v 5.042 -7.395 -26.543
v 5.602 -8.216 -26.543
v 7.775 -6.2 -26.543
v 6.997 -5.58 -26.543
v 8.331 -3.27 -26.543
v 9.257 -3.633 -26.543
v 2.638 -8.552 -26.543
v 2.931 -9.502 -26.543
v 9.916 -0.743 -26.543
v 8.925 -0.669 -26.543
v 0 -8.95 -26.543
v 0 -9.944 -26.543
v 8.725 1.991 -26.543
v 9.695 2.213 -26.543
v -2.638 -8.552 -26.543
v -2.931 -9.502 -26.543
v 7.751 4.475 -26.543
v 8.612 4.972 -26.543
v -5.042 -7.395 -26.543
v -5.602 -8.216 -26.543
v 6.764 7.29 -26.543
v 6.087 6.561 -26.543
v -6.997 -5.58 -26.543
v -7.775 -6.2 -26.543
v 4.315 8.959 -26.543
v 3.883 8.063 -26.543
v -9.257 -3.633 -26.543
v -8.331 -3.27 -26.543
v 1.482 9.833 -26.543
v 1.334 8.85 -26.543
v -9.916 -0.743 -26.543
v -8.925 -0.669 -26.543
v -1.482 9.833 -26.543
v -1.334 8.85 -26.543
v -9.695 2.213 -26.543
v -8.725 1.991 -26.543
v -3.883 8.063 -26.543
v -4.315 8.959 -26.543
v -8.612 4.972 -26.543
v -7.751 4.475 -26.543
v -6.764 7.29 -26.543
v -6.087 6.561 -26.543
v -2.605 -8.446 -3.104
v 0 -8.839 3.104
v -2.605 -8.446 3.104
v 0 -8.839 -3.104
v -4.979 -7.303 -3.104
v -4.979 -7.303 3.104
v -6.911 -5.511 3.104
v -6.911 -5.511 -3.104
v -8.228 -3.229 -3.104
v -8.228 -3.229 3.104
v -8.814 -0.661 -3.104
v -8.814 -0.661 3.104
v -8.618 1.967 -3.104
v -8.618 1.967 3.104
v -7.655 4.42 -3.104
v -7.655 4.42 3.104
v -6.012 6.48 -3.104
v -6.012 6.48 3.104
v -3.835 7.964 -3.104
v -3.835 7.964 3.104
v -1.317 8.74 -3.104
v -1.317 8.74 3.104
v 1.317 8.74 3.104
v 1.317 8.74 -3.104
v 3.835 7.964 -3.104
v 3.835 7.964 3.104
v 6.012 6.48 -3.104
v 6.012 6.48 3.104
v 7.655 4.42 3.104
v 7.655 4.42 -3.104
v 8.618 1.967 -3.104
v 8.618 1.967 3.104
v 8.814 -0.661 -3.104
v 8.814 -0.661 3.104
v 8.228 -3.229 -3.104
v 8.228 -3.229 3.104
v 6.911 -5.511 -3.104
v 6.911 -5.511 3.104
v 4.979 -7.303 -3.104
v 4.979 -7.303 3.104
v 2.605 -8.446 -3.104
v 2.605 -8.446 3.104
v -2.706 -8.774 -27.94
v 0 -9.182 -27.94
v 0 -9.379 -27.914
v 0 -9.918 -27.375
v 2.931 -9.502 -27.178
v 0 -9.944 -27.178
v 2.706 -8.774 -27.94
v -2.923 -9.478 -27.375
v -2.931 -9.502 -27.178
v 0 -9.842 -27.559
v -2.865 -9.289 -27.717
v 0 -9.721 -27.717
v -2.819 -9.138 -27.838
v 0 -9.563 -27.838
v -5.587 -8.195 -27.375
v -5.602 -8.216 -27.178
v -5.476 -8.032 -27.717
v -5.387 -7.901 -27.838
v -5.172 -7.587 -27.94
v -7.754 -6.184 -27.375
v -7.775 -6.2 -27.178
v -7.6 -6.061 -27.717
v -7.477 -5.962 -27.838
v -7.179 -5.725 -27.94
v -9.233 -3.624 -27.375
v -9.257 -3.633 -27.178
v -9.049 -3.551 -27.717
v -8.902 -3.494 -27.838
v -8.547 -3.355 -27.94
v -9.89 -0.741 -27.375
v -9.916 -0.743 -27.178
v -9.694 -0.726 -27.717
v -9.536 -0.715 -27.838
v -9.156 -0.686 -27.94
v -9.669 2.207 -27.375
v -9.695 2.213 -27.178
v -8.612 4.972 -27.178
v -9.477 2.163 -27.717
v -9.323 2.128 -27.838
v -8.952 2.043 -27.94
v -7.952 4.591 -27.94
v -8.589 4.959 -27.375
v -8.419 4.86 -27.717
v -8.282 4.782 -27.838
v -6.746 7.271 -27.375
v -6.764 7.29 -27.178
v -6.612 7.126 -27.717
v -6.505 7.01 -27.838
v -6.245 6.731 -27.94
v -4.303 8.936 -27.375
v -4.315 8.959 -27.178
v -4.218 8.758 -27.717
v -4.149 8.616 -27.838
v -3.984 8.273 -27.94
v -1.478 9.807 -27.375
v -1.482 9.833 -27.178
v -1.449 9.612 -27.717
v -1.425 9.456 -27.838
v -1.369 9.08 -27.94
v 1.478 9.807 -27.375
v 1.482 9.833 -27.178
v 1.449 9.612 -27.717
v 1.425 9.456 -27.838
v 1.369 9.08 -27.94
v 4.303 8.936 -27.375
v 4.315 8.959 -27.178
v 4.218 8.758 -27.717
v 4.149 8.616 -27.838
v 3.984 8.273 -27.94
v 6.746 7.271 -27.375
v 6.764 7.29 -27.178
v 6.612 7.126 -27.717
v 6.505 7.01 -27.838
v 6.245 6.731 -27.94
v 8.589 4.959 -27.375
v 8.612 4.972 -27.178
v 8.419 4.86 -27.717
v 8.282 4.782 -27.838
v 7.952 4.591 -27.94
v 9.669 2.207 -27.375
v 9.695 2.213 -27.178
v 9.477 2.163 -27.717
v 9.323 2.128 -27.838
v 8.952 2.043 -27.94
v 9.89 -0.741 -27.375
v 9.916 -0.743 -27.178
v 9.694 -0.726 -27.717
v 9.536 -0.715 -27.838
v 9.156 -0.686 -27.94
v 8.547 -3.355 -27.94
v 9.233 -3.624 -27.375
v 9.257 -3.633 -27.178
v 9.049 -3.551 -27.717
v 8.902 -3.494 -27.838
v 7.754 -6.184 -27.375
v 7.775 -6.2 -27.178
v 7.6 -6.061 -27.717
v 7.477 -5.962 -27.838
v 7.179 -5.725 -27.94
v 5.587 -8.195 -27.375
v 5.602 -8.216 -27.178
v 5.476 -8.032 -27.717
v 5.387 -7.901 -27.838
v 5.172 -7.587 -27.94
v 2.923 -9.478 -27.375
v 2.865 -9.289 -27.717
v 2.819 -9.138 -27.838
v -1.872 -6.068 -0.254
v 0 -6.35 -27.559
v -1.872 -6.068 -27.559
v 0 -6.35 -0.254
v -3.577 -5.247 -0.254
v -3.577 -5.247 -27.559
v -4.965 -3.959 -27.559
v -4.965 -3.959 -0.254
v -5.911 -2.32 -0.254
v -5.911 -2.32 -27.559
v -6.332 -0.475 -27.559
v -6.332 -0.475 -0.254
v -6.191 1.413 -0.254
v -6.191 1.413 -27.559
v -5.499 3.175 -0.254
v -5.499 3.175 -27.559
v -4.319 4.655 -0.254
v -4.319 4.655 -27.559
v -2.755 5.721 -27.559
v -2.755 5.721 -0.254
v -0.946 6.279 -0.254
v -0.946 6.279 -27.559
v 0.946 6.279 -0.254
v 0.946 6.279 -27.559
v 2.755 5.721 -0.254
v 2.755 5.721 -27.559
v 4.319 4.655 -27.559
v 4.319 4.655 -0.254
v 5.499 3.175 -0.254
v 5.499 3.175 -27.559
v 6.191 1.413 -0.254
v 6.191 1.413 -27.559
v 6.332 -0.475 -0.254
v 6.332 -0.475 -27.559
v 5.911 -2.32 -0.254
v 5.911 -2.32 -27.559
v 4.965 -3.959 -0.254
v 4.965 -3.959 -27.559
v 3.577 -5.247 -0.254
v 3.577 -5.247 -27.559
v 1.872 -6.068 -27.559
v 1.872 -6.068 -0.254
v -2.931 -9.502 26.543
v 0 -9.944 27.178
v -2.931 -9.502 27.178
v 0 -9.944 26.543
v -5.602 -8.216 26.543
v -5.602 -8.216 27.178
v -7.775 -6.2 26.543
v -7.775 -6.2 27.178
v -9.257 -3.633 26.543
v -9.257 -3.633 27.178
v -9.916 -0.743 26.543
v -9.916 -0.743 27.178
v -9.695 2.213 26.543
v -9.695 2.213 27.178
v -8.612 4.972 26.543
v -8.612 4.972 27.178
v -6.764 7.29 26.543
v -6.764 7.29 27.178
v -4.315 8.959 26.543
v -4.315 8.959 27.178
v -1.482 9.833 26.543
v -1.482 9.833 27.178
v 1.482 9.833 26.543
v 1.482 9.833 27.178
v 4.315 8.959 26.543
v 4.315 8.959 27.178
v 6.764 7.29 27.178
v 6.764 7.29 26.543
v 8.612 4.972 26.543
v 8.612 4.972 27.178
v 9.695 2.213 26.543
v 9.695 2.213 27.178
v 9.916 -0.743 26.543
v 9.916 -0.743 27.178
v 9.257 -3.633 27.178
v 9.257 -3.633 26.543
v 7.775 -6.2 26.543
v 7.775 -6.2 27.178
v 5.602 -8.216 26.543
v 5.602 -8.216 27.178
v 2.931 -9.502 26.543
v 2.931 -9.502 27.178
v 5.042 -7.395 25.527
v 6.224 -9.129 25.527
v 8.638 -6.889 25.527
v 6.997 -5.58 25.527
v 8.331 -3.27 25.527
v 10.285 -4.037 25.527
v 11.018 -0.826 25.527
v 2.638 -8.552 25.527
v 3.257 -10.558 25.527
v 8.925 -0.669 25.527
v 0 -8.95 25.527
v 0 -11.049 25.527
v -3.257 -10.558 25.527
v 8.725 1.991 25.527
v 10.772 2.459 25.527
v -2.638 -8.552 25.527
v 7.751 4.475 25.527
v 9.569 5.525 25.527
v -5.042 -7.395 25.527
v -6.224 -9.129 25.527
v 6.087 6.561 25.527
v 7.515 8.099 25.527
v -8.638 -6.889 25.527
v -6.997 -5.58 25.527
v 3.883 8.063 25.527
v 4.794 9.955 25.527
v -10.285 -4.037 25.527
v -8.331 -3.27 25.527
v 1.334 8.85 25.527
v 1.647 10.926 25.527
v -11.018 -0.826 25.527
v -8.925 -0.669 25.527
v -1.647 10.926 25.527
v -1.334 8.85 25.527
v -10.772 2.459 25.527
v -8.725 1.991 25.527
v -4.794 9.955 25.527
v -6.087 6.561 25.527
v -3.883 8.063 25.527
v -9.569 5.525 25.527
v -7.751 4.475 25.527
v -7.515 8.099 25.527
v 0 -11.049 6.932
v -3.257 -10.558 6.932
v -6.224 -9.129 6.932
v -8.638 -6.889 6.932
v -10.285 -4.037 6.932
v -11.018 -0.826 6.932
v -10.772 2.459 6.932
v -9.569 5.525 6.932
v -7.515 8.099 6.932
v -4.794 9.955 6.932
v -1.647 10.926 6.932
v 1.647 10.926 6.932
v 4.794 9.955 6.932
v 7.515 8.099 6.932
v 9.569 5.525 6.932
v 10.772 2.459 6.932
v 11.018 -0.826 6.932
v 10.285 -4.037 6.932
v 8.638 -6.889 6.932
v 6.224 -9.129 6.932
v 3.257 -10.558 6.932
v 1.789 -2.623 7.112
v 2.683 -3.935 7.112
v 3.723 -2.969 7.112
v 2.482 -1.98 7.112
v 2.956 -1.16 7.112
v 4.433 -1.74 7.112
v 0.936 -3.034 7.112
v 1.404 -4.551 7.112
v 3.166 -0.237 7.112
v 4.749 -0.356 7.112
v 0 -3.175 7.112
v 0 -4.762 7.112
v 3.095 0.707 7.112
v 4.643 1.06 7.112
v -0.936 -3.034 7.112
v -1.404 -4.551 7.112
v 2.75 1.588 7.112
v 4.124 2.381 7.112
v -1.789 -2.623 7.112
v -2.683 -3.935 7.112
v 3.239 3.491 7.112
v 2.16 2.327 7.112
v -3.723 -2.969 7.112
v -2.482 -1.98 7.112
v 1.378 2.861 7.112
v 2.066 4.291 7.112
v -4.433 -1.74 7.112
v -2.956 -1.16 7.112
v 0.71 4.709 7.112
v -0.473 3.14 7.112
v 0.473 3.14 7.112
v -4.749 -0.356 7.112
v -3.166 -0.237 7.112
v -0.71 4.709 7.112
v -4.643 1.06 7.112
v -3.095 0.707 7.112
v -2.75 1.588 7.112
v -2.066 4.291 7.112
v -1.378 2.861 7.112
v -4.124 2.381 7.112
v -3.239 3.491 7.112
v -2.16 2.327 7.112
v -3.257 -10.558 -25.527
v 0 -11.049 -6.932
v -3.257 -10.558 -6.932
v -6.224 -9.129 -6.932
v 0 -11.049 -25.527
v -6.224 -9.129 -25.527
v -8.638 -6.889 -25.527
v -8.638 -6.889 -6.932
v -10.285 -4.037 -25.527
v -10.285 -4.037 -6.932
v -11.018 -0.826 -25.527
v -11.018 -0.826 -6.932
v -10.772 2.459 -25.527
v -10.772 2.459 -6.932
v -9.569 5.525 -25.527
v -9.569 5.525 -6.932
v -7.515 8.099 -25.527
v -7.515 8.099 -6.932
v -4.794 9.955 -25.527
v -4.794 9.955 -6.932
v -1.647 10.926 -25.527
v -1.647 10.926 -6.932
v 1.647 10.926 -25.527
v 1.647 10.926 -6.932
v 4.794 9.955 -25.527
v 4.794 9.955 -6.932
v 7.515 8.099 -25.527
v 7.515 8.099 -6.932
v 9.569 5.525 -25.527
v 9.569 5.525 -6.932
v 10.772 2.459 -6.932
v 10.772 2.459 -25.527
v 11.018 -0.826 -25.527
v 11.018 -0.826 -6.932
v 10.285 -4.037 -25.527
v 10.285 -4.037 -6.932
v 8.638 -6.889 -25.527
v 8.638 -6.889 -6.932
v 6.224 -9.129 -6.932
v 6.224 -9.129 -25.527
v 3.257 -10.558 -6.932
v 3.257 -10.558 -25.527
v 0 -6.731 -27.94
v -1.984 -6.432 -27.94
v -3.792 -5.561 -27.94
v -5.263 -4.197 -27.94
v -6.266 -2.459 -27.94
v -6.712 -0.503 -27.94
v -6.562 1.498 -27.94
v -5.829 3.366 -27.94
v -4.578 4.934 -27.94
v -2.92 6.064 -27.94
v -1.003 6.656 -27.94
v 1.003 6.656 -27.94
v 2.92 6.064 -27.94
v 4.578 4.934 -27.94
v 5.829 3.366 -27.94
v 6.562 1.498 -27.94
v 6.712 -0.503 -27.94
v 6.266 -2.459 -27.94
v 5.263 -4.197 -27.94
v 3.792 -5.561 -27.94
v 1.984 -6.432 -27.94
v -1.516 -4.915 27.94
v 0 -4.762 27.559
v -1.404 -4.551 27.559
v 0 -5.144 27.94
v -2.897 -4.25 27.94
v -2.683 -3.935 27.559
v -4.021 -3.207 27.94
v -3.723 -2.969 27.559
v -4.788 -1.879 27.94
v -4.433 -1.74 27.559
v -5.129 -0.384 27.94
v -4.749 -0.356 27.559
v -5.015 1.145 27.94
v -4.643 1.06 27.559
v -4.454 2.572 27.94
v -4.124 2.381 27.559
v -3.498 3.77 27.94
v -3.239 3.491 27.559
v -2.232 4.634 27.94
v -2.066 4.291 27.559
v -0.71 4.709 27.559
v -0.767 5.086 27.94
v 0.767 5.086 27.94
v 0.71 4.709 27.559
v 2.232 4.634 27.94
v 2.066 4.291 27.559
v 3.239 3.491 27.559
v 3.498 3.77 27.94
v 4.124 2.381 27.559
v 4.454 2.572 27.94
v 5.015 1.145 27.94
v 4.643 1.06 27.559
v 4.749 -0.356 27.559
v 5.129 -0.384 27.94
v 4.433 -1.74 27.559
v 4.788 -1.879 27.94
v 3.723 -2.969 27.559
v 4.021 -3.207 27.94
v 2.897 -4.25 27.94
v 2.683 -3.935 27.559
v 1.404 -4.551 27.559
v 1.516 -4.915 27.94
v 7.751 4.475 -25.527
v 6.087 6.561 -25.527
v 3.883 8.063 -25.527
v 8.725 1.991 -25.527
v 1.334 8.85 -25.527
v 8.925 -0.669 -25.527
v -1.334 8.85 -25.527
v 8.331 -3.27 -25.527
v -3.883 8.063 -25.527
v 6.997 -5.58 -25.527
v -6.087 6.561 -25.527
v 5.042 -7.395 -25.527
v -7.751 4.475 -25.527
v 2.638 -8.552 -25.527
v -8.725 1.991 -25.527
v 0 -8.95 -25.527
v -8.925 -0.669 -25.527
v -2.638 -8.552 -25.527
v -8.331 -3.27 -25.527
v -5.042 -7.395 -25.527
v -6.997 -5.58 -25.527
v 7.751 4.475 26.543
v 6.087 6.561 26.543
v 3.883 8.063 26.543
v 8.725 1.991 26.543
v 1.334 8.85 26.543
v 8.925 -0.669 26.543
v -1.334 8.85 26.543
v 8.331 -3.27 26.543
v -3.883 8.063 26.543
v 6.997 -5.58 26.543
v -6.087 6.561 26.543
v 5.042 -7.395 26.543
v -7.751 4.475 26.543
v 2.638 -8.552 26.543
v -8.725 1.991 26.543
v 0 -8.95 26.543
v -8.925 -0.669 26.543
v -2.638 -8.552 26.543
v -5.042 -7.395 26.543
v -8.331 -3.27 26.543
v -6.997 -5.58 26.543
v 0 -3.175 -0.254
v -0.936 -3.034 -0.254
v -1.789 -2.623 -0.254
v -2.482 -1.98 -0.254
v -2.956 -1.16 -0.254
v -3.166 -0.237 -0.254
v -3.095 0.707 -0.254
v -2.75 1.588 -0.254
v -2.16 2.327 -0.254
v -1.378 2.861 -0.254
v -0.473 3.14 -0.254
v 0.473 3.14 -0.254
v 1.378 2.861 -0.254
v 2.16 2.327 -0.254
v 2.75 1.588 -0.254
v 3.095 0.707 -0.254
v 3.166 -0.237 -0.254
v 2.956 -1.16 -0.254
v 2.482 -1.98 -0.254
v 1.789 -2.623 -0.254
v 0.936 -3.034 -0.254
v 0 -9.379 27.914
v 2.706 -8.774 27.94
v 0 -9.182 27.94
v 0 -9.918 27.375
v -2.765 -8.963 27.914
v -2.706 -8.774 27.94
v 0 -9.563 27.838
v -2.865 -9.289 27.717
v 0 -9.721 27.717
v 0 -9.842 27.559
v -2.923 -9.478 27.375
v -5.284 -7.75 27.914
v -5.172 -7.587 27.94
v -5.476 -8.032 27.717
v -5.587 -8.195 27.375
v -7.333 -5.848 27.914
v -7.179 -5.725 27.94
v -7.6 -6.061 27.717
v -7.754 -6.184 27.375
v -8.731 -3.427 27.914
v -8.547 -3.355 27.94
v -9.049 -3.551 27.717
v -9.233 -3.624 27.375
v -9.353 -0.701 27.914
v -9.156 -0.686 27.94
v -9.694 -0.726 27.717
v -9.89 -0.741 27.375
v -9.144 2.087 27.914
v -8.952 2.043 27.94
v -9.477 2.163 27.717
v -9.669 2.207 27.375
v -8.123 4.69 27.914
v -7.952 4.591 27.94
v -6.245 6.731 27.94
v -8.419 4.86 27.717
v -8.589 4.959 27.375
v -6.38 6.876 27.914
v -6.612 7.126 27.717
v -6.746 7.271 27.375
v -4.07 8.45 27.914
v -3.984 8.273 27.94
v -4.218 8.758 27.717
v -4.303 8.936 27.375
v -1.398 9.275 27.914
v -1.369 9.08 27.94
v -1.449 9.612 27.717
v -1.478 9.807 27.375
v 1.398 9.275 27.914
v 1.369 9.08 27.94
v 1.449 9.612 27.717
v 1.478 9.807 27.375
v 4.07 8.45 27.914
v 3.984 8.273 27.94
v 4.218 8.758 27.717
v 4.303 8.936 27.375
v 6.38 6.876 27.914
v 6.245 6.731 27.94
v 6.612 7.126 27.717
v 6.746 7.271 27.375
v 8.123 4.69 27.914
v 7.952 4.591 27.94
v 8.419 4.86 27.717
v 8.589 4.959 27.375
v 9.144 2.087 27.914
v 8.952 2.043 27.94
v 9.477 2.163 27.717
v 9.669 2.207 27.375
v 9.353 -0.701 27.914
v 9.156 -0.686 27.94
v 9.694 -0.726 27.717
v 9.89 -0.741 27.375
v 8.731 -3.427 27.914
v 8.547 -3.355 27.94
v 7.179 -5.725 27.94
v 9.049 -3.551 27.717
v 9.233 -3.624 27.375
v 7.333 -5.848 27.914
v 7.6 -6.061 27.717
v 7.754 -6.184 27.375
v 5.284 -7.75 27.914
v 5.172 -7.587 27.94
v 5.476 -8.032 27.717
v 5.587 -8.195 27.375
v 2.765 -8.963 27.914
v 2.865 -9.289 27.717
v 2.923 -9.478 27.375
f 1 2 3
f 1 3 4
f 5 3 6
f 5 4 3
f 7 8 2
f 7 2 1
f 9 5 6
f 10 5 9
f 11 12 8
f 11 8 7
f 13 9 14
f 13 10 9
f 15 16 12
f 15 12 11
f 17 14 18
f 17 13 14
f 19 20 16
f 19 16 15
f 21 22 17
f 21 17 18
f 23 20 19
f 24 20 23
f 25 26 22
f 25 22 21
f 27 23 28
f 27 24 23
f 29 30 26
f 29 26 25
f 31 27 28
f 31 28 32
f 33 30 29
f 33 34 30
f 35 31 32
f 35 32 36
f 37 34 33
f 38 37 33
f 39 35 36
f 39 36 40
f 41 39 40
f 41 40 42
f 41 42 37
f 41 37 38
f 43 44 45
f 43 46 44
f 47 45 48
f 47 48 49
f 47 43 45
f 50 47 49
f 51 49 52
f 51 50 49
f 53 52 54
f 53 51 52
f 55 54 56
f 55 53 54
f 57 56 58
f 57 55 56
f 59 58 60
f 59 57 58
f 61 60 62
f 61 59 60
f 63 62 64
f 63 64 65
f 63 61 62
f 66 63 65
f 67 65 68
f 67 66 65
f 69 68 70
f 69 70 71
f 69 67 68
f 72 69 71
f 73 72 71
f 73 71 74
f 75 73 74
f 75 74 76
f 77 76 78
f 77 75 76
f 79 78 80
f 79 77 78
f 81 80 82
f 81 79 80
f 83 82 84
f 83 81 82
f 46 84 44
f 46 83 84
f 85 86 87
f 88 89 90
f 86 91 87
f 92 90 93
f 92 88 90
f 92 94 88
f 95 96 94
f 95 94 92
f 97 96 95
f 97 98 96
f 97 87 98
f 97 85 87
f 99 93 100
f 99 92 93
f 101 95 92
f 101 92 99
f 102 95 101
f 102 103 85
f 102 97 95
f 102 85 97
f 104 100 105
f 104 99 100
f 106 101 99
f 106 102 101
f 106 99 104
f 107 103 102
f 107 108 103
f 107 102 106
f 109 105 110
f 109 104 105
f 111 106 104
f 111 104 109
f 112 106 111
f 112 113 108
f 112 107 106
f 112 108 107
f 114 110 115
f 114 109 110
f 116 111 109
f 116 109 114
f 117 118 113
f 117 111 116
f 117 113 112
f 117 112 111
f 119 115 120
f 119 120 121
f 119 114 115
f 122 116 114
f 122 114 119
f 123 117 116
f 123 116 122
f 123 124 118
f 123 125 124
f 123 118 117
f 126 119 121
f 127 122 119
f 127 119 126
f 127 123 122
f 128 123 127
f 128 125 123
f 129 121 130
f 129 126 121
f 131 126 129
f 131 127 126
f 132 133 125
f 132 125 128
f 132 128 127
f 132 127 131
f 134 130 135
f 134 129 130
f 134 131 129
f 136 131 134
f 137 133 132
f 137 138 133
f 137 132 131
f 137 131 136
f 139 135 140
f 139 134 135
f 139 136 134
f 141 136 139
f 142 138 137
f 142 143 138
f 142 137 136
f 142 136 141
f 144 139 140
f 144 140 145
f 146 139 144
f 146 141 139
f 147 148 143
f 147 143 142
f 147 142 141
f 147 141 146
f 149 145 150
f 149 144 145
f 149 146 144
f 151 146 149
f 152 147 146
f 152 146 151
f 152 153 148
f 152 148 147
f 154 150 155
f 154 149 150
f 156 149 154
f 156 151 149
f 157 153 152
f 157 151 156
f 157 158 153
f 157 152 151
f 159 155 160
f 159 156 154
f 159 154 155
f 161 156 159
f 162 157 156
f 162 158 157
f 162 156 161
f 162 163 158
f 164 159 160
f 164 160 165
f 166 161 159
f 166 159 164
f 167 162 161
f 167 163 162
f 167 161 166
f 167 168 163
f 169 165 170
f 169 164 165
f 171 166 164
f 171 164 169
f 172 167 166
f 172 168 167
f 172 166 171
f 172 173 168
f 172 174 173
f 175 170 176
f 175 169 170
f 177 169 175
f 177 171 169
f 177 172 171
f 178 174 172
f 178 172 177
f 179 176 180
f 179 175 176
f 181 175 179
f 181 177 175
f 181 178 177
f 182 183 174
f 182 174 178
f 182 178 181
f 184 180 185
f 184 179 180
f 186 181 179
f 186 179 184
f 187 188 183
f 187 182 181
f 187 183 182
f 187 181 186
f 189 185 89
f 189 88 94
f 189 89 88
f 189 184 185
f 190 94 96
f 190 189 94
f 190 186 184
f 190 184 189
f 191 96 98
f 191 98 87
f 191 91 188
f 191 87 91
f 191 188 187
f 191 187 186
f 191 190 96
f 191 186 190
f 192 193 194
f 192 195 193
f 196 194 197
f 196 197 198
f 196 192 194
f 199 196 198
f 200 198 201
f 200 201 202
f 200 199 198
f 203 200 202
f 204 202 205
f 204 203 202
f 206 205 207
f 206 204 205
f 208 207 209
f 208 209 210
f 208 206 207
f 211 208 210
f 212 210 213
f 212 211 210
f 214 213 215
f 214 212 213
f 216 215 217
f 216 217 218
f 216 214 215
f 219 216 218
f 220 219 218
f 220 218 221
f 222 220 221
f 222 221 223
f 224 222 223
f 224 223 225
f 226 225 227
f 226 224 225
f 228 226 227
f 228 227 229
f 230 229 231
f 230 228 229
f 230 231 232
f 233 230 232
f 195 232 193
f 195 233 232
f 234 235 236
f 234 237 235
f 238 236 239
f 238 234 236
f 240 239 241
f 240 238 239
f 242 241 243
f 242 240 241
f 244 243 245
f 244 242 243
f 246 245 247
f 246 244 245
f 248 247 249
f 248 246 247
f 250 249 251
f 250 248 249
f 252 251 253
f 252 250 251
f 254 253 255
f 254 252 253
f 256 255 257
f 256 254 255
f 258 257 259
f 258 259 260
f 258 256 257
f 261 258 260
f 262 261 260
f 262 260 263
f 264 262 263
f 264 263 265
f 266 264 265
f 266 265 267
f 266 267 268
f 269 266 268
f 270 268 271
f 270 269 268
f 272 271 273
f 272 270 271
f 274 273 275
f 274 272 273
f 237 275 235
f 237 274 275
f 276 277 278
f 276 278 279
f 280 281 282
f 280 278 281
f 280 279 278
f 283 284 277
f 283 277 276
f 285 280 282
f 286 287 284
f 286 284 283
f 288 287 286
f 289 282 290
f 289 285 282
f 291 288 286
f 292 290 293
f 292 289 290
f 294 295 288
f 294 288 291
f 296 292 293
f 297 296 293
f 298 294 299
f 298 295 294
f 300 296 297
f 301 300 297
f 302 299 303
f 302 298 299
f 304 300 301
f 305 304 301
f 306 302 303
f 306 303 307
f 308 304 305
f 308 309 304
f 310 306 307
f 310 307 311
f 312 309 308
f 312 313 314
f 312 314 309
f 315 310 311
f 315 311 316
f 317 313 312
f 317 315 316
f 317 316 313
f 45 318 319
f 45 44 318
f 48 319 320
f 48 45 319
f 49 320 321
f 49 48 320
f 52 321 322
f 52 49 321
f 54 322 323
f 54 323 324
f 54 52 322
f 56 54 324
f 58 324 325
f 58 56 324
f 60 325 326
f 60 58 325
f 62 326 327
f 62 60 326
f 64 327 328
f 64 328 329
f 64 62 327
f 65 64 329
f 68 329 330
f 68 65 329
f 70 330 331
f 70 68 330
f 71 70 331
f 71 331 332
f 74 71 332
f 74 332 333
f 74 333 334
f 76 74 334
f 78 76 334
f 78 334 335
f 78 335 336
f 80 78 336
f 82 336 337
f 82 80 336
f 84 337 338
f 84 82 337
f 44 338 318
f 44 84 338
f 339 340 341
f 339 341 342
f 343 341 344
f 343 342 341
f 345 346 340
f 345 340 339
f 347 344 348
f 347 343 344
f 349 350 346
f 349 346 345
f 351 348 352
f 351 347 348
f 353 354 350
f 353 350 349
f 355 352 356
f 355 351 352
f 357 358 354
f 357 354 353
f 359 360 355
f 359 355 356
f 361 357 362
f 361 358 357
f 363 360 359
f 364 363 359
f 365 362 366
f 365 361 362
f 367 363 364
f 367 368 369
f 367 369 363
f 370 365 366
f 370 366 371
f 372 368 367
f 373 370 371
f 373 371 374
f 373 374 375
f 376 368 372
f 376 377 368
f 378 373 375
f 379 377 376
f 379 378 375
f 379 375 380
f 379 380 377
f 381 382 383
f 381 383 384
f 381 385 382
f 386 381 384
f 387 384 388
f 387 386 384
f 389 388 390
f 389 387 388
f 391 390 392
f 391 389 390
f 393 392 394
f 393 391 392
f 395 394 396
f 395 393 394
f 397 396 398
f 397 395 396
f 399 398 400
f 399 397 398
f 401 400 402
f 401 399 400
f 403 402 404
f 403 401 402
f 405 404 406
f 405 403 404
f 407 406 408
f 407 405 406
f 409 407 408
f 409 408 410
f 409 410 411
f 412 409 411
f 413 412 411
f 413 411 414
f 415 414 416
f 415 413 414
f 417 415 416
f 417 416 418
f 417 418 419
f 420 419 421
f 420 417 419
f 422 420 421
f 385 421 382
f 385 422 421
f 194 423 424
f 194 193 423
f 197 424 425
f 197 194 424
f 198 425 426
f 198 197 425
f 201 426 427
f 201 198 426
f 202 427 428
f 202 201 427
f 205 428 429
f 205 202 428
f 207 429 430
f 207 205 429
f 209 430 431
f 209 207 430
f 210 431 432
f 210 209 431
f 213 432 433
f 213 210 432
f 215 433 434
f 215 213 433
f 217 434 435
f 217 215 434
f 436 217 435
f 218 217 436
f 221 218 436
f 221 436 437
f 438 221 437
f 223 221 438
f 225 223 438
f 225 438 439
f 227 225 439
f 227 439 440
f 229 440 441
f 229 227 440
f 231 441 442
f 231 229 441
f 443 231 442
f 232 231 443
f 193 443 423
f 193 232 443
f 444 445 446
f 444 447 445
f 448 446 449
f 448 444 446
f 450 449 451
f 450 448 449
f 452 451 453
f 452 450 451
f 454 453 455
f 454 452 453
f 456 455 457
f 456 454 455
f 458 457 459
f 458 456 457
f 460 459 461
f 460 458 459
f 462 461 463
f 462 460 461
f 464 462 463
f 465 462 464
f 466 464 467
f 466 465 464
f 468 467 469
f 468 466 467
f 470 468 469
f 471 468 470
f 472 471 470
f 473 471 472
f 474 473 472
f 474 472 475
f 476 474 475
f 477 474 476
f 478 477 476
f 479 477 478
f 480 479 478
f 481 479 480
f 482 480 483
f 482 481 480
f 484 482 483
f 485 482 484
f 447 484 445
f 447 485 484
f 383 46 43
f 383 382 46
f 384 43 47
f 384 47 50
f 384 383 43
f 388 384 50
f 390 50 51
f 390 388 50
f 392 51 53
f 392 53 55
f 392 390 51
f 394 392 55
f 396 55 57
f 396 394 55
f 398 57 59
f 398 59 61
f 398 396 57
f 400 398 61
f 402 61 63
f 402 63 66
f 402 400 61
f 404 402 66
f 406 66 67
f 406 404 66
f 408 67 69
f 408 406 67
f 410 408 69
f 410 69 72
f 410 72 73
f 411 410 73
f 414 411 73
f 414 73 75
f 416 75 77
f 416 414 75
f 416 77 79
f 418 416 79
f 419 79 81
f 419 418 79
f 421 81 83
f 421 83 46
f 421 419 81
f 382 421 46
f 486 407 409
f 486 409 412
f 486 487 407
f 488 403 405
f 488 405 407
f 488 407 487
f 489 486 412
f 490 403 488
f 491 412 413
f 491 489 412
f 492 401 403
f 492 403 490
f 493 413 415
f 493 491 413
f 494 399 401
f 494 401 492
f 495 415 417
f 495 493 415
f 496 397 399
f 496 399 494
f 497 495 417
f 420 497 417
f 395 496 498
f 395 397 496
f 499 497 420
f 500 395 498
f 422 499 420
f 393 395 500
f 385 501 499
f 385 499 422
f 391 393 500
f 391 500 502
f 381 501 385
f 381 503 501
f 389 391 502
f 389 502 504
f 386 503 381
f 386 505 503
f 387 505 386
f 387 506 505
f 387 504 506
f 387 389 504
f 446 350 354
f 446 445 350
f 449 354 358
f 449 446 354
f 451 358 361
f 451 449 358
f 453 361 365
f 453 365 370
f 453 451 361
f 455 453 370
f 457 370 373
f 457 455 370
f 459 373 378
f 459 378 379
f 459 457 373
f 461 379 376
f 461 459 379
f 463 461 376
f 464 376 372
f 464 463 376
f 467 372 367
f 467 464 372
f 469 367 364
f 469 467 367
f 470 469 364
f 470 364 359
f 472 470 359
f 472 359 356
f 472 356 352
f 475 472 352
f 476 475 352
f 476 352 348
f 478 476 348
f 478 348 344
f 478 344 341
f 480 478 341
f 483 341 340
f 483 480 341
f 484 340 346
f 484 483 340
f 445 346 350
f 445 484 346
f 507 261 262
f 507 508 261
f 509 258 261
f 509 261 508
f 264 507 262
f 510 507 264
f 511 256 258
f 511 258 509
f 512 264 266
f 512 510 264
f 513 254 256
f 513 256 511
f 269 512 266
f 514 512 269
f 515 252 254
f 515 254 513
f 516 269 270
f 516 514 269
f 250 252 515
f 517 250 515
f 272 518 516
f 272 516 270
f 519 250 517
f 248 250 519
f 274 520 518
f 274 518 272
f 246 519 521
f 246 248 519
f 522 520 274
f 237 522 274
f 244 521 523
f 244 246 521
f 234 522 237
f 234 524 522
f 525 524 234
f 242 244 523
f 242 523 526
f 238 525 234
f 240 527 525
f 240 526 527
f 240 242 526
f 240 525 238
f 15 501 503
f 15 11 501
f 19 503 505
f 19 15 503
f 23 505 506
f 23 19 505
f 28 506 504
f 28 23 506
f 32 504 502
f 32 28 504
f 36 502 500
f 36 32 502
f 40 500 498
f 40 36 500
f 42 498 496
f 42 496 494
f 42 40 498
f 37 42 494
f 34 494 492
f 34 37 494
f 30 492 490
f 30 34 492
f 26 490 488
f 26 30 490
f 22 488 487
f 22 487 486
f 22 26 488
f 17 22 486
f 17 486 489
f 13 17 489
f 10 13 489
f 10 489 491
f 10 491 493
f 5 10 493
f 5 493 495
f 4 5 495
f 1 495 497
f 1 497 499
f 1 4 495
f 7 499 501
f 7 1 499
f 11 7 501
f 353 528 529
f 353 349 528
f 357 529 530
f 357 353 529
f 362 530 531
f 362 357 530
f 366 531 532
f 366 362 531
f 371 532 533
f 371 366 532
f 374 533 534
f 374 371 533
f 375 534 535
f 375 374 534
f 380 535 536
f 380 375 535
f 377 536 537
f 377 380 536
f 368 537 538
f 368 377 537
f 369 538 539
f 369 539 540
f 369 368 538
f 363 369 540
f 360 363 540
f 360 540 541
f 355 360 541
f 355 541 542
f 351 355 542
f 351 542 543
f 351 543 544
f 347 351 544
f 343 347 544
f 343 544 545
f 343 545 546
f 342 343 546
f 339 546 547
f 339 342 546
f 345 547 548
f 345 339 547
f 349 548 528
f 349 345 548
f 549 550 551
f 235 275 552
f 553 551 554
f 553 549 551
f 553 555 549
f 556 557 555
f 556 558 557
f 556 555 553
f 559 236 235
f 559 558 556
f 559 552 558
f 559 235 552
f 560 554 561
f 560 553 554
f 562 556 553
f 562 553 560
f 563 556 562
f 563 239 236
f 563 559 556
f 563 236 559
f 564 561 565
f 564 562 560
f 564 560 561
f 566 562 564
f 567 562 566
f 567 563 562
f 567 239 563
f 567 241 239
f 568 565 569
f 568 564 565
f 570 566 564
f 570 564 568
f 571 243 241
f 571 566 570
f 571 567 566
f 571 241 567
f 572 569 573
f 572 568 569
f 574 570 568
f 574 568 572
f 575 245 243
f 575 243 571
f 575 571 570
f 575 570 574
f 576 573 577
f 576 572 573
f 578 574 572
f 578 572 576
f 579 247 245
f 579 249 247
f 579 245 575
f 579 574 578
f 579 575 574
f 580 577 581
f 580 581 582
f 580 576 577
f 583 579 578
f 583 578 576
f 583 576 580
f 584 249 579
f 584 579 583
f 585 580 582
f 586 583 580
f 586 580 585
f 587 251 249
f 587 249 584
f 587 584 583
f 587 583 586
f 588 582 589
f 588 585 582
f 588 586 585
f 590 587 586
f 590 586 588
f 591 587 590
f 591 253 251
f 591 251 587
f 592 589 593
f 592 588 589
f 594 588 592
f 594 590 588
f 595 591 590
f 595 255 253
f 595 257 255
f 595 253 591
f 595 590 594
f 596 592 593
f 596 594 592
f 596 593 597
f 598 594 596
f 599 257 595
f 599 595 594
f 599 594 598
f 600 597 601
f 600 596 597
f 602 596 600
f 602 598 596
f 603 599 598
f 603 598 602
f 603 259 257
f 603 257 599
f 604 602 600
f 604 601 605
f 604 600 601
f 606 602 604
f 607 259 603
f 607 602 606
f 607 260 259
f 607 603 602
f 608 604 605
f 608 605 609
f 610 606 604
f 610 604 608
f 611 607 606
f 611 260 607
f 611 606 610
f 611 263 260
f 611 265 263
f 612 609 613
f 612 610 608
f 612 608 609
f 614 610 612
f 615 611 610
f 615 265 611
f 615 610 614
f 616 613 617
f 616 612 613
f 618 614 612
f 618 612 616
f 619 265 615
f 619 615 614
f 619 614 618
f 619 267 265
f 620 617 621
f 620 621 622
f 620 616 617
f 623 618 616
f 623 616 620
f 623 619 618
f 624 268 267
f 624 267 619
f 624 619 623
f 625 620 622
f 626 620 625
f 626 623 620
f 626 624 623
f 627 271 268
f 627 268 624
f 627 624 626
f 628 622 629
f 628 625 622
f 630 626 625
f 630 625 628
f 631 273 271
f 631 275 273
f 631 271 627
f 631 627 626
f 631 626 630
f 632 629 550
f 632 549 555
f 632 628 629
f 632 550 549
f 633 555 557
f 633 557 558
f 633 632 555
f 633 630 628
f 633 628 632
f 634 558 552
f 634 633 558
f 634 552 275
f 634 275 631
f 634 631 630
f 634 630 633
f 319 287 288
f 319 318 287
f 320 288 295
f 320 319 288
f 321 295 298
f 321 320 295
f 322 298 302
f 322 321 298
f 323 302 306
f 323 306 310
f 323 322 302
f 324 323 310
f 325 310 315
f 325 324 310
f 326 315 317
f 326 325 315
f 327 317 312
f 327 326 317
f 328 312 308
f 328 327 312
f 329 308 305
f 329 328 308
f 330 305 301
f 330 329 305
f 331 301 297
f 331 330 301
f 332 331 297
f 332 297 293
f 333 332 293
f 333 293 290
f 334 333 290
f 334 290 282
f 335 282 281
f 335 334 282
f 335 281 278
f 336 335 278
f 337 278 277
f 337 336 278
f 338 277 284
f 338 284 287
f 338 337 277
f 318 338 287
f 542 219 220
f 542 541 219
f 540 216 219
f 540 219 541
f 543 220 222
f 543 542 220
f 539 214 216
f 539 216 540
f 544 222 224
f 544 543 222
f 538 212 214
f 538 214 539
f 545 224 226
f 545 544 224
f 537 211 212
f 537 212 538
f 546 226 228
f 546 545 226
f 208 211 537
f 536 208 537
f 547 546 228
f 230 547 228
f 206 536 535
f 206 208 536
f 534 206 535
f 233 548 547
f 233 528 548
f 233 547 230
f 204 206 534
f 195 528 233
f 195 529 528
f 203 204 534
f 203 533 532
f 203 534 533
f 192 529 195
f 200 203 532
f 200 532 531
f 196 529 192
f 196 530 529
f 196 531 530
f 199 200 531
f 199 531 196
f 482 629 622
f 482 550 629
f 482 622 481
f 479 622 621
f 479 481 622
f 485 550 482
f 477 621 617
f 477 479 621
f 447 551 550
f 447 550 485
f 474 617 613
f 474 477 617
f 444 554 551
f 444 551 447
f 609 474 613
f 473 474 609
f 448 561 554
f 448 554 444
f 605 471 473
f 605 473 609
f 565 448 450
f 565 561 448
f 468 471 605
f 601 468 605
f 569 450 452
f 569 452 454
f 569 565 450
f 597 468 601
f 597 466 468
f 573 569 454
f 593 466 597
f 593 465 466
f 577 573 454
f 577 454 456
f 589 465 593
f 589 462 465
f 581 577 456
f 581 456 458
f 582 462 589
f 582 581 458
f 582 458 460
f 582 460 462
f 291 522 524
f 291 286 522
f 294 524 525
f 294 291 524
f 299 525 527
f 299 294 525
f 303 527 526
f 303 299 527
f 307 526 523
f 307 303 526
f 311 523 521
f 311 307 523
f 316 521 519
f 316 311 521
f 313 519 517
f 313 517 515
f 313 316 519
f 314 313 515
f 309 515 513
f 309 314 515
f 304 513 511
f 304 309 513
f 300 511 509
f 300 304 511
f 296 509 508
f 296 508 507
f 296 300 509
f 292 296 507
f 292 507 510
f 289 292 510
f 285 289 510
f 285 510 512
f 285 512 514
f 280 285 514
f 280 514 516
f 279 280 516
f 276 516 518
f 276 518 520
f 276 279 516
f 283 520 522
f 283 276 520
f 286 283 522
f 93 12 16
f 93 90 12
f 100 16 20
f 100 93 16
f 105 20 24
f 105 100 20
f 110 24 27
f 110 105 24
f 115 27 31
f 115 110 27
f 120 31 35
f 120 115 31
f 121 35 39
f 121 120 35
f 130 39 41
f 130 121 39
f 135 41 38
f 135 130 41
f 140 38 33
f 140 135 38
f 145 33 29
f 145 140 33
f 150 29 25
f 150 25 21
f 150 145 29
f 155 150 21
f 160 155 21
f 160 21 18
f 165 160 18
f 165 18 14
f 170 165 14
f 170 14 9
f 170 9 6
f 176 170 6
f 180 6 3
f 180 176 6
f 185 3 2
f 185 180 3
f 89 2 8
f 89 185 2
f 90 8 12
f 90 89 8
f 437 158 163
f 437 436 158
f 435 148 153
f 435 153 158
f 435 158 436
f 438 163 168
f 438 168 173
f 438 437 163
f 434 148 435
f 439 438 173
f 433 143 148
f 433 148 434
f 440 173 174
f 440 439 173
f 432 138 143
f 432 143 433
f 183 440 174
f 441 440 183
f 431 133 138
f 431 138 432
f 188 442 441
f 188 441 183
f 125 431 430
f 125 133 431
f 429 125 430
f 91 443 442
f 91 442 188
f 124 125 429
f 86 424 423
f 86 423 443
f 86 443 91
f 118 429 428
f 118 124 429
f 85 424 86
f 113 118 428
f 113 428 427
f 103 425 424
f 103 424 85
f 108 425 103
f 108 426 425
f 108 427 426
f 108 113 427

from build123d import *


with BuildPart() as part:
    # Sketch1 → Revolve1 (revolve)
    with BuildSketch(Plane(origin=(0, 0, 0), x_dir=(0, 0, -1), z_dir=(1, 0, 0)), mode=Mode.PRIVATE) as revolve1_sk:
        with BuildLine():
            Line((26.543, 9.9441), (27.178, 9.9441))
            ThreePointArc((27.178, 9.9441), (27.716815367, 9.720915367), (27.94, 9.1821))
            Line((27.94, 9.1821), (27.94, 6.731))
            Line((27.94, 6.731), (27.559, 6.35))
            Line((27.559, 6.35), (0.254, 6.35))
            Line((0.254, 6.35), (0.254, 3.175))
            Line((0.254, 3.175), (-7.112, 3.175))
            Line((-7.112, 3.175), (-7.112, 4.7625))
            Line((-7.112, 4.7625), (-27.559, 4.7625))
            Line((-27.559, 4.7625), (-27.94, 5.1435))
            Line((-27.94, 5.1435), (-27.94, 9.1821))
            ThreePointArc((-27.94, 9.1821), (-27.716815367, 9.720915367), (-27.178, 9.9441))
            Line((-27.178, 9.9441), (-26.543, 9.9441))
            Line((-26.543, 9.9441), (-26.543, 8.94969))
            Line((-26.543, 8.94969), (-25.527, 8.94969))
            Line((-25.527, 8.94969), (-25.527, 11.049))
            Line((-25.527, 11.049), (-6.931930319, 11.049))
            Line((-6.931930319, 11.049), (-3.104444444, 8.8392))
            Line((-3.104444444, 8.8392), (3.104444444, 8.8392))
            Line((3.104444444, 8.8392), (6.931930319, 11.049))
            Line((6.931930319, 11.049), (25.527, 11.049))
            Line((25.527, 11.049), (25.527, 8.94969))
            Line((25.527, 8.94969), (26.543, 8.94969))
            Line((26.543, 8.94969), (26.543, 9.9441))
        make_face()
    revolve(revolve1_sk.sketch.rotate(Axis((0, 0, 0), (0, 0, -1)), 180), axis=Axis((0, 0, 0), (0, 0, -1)))


solid = part.part
